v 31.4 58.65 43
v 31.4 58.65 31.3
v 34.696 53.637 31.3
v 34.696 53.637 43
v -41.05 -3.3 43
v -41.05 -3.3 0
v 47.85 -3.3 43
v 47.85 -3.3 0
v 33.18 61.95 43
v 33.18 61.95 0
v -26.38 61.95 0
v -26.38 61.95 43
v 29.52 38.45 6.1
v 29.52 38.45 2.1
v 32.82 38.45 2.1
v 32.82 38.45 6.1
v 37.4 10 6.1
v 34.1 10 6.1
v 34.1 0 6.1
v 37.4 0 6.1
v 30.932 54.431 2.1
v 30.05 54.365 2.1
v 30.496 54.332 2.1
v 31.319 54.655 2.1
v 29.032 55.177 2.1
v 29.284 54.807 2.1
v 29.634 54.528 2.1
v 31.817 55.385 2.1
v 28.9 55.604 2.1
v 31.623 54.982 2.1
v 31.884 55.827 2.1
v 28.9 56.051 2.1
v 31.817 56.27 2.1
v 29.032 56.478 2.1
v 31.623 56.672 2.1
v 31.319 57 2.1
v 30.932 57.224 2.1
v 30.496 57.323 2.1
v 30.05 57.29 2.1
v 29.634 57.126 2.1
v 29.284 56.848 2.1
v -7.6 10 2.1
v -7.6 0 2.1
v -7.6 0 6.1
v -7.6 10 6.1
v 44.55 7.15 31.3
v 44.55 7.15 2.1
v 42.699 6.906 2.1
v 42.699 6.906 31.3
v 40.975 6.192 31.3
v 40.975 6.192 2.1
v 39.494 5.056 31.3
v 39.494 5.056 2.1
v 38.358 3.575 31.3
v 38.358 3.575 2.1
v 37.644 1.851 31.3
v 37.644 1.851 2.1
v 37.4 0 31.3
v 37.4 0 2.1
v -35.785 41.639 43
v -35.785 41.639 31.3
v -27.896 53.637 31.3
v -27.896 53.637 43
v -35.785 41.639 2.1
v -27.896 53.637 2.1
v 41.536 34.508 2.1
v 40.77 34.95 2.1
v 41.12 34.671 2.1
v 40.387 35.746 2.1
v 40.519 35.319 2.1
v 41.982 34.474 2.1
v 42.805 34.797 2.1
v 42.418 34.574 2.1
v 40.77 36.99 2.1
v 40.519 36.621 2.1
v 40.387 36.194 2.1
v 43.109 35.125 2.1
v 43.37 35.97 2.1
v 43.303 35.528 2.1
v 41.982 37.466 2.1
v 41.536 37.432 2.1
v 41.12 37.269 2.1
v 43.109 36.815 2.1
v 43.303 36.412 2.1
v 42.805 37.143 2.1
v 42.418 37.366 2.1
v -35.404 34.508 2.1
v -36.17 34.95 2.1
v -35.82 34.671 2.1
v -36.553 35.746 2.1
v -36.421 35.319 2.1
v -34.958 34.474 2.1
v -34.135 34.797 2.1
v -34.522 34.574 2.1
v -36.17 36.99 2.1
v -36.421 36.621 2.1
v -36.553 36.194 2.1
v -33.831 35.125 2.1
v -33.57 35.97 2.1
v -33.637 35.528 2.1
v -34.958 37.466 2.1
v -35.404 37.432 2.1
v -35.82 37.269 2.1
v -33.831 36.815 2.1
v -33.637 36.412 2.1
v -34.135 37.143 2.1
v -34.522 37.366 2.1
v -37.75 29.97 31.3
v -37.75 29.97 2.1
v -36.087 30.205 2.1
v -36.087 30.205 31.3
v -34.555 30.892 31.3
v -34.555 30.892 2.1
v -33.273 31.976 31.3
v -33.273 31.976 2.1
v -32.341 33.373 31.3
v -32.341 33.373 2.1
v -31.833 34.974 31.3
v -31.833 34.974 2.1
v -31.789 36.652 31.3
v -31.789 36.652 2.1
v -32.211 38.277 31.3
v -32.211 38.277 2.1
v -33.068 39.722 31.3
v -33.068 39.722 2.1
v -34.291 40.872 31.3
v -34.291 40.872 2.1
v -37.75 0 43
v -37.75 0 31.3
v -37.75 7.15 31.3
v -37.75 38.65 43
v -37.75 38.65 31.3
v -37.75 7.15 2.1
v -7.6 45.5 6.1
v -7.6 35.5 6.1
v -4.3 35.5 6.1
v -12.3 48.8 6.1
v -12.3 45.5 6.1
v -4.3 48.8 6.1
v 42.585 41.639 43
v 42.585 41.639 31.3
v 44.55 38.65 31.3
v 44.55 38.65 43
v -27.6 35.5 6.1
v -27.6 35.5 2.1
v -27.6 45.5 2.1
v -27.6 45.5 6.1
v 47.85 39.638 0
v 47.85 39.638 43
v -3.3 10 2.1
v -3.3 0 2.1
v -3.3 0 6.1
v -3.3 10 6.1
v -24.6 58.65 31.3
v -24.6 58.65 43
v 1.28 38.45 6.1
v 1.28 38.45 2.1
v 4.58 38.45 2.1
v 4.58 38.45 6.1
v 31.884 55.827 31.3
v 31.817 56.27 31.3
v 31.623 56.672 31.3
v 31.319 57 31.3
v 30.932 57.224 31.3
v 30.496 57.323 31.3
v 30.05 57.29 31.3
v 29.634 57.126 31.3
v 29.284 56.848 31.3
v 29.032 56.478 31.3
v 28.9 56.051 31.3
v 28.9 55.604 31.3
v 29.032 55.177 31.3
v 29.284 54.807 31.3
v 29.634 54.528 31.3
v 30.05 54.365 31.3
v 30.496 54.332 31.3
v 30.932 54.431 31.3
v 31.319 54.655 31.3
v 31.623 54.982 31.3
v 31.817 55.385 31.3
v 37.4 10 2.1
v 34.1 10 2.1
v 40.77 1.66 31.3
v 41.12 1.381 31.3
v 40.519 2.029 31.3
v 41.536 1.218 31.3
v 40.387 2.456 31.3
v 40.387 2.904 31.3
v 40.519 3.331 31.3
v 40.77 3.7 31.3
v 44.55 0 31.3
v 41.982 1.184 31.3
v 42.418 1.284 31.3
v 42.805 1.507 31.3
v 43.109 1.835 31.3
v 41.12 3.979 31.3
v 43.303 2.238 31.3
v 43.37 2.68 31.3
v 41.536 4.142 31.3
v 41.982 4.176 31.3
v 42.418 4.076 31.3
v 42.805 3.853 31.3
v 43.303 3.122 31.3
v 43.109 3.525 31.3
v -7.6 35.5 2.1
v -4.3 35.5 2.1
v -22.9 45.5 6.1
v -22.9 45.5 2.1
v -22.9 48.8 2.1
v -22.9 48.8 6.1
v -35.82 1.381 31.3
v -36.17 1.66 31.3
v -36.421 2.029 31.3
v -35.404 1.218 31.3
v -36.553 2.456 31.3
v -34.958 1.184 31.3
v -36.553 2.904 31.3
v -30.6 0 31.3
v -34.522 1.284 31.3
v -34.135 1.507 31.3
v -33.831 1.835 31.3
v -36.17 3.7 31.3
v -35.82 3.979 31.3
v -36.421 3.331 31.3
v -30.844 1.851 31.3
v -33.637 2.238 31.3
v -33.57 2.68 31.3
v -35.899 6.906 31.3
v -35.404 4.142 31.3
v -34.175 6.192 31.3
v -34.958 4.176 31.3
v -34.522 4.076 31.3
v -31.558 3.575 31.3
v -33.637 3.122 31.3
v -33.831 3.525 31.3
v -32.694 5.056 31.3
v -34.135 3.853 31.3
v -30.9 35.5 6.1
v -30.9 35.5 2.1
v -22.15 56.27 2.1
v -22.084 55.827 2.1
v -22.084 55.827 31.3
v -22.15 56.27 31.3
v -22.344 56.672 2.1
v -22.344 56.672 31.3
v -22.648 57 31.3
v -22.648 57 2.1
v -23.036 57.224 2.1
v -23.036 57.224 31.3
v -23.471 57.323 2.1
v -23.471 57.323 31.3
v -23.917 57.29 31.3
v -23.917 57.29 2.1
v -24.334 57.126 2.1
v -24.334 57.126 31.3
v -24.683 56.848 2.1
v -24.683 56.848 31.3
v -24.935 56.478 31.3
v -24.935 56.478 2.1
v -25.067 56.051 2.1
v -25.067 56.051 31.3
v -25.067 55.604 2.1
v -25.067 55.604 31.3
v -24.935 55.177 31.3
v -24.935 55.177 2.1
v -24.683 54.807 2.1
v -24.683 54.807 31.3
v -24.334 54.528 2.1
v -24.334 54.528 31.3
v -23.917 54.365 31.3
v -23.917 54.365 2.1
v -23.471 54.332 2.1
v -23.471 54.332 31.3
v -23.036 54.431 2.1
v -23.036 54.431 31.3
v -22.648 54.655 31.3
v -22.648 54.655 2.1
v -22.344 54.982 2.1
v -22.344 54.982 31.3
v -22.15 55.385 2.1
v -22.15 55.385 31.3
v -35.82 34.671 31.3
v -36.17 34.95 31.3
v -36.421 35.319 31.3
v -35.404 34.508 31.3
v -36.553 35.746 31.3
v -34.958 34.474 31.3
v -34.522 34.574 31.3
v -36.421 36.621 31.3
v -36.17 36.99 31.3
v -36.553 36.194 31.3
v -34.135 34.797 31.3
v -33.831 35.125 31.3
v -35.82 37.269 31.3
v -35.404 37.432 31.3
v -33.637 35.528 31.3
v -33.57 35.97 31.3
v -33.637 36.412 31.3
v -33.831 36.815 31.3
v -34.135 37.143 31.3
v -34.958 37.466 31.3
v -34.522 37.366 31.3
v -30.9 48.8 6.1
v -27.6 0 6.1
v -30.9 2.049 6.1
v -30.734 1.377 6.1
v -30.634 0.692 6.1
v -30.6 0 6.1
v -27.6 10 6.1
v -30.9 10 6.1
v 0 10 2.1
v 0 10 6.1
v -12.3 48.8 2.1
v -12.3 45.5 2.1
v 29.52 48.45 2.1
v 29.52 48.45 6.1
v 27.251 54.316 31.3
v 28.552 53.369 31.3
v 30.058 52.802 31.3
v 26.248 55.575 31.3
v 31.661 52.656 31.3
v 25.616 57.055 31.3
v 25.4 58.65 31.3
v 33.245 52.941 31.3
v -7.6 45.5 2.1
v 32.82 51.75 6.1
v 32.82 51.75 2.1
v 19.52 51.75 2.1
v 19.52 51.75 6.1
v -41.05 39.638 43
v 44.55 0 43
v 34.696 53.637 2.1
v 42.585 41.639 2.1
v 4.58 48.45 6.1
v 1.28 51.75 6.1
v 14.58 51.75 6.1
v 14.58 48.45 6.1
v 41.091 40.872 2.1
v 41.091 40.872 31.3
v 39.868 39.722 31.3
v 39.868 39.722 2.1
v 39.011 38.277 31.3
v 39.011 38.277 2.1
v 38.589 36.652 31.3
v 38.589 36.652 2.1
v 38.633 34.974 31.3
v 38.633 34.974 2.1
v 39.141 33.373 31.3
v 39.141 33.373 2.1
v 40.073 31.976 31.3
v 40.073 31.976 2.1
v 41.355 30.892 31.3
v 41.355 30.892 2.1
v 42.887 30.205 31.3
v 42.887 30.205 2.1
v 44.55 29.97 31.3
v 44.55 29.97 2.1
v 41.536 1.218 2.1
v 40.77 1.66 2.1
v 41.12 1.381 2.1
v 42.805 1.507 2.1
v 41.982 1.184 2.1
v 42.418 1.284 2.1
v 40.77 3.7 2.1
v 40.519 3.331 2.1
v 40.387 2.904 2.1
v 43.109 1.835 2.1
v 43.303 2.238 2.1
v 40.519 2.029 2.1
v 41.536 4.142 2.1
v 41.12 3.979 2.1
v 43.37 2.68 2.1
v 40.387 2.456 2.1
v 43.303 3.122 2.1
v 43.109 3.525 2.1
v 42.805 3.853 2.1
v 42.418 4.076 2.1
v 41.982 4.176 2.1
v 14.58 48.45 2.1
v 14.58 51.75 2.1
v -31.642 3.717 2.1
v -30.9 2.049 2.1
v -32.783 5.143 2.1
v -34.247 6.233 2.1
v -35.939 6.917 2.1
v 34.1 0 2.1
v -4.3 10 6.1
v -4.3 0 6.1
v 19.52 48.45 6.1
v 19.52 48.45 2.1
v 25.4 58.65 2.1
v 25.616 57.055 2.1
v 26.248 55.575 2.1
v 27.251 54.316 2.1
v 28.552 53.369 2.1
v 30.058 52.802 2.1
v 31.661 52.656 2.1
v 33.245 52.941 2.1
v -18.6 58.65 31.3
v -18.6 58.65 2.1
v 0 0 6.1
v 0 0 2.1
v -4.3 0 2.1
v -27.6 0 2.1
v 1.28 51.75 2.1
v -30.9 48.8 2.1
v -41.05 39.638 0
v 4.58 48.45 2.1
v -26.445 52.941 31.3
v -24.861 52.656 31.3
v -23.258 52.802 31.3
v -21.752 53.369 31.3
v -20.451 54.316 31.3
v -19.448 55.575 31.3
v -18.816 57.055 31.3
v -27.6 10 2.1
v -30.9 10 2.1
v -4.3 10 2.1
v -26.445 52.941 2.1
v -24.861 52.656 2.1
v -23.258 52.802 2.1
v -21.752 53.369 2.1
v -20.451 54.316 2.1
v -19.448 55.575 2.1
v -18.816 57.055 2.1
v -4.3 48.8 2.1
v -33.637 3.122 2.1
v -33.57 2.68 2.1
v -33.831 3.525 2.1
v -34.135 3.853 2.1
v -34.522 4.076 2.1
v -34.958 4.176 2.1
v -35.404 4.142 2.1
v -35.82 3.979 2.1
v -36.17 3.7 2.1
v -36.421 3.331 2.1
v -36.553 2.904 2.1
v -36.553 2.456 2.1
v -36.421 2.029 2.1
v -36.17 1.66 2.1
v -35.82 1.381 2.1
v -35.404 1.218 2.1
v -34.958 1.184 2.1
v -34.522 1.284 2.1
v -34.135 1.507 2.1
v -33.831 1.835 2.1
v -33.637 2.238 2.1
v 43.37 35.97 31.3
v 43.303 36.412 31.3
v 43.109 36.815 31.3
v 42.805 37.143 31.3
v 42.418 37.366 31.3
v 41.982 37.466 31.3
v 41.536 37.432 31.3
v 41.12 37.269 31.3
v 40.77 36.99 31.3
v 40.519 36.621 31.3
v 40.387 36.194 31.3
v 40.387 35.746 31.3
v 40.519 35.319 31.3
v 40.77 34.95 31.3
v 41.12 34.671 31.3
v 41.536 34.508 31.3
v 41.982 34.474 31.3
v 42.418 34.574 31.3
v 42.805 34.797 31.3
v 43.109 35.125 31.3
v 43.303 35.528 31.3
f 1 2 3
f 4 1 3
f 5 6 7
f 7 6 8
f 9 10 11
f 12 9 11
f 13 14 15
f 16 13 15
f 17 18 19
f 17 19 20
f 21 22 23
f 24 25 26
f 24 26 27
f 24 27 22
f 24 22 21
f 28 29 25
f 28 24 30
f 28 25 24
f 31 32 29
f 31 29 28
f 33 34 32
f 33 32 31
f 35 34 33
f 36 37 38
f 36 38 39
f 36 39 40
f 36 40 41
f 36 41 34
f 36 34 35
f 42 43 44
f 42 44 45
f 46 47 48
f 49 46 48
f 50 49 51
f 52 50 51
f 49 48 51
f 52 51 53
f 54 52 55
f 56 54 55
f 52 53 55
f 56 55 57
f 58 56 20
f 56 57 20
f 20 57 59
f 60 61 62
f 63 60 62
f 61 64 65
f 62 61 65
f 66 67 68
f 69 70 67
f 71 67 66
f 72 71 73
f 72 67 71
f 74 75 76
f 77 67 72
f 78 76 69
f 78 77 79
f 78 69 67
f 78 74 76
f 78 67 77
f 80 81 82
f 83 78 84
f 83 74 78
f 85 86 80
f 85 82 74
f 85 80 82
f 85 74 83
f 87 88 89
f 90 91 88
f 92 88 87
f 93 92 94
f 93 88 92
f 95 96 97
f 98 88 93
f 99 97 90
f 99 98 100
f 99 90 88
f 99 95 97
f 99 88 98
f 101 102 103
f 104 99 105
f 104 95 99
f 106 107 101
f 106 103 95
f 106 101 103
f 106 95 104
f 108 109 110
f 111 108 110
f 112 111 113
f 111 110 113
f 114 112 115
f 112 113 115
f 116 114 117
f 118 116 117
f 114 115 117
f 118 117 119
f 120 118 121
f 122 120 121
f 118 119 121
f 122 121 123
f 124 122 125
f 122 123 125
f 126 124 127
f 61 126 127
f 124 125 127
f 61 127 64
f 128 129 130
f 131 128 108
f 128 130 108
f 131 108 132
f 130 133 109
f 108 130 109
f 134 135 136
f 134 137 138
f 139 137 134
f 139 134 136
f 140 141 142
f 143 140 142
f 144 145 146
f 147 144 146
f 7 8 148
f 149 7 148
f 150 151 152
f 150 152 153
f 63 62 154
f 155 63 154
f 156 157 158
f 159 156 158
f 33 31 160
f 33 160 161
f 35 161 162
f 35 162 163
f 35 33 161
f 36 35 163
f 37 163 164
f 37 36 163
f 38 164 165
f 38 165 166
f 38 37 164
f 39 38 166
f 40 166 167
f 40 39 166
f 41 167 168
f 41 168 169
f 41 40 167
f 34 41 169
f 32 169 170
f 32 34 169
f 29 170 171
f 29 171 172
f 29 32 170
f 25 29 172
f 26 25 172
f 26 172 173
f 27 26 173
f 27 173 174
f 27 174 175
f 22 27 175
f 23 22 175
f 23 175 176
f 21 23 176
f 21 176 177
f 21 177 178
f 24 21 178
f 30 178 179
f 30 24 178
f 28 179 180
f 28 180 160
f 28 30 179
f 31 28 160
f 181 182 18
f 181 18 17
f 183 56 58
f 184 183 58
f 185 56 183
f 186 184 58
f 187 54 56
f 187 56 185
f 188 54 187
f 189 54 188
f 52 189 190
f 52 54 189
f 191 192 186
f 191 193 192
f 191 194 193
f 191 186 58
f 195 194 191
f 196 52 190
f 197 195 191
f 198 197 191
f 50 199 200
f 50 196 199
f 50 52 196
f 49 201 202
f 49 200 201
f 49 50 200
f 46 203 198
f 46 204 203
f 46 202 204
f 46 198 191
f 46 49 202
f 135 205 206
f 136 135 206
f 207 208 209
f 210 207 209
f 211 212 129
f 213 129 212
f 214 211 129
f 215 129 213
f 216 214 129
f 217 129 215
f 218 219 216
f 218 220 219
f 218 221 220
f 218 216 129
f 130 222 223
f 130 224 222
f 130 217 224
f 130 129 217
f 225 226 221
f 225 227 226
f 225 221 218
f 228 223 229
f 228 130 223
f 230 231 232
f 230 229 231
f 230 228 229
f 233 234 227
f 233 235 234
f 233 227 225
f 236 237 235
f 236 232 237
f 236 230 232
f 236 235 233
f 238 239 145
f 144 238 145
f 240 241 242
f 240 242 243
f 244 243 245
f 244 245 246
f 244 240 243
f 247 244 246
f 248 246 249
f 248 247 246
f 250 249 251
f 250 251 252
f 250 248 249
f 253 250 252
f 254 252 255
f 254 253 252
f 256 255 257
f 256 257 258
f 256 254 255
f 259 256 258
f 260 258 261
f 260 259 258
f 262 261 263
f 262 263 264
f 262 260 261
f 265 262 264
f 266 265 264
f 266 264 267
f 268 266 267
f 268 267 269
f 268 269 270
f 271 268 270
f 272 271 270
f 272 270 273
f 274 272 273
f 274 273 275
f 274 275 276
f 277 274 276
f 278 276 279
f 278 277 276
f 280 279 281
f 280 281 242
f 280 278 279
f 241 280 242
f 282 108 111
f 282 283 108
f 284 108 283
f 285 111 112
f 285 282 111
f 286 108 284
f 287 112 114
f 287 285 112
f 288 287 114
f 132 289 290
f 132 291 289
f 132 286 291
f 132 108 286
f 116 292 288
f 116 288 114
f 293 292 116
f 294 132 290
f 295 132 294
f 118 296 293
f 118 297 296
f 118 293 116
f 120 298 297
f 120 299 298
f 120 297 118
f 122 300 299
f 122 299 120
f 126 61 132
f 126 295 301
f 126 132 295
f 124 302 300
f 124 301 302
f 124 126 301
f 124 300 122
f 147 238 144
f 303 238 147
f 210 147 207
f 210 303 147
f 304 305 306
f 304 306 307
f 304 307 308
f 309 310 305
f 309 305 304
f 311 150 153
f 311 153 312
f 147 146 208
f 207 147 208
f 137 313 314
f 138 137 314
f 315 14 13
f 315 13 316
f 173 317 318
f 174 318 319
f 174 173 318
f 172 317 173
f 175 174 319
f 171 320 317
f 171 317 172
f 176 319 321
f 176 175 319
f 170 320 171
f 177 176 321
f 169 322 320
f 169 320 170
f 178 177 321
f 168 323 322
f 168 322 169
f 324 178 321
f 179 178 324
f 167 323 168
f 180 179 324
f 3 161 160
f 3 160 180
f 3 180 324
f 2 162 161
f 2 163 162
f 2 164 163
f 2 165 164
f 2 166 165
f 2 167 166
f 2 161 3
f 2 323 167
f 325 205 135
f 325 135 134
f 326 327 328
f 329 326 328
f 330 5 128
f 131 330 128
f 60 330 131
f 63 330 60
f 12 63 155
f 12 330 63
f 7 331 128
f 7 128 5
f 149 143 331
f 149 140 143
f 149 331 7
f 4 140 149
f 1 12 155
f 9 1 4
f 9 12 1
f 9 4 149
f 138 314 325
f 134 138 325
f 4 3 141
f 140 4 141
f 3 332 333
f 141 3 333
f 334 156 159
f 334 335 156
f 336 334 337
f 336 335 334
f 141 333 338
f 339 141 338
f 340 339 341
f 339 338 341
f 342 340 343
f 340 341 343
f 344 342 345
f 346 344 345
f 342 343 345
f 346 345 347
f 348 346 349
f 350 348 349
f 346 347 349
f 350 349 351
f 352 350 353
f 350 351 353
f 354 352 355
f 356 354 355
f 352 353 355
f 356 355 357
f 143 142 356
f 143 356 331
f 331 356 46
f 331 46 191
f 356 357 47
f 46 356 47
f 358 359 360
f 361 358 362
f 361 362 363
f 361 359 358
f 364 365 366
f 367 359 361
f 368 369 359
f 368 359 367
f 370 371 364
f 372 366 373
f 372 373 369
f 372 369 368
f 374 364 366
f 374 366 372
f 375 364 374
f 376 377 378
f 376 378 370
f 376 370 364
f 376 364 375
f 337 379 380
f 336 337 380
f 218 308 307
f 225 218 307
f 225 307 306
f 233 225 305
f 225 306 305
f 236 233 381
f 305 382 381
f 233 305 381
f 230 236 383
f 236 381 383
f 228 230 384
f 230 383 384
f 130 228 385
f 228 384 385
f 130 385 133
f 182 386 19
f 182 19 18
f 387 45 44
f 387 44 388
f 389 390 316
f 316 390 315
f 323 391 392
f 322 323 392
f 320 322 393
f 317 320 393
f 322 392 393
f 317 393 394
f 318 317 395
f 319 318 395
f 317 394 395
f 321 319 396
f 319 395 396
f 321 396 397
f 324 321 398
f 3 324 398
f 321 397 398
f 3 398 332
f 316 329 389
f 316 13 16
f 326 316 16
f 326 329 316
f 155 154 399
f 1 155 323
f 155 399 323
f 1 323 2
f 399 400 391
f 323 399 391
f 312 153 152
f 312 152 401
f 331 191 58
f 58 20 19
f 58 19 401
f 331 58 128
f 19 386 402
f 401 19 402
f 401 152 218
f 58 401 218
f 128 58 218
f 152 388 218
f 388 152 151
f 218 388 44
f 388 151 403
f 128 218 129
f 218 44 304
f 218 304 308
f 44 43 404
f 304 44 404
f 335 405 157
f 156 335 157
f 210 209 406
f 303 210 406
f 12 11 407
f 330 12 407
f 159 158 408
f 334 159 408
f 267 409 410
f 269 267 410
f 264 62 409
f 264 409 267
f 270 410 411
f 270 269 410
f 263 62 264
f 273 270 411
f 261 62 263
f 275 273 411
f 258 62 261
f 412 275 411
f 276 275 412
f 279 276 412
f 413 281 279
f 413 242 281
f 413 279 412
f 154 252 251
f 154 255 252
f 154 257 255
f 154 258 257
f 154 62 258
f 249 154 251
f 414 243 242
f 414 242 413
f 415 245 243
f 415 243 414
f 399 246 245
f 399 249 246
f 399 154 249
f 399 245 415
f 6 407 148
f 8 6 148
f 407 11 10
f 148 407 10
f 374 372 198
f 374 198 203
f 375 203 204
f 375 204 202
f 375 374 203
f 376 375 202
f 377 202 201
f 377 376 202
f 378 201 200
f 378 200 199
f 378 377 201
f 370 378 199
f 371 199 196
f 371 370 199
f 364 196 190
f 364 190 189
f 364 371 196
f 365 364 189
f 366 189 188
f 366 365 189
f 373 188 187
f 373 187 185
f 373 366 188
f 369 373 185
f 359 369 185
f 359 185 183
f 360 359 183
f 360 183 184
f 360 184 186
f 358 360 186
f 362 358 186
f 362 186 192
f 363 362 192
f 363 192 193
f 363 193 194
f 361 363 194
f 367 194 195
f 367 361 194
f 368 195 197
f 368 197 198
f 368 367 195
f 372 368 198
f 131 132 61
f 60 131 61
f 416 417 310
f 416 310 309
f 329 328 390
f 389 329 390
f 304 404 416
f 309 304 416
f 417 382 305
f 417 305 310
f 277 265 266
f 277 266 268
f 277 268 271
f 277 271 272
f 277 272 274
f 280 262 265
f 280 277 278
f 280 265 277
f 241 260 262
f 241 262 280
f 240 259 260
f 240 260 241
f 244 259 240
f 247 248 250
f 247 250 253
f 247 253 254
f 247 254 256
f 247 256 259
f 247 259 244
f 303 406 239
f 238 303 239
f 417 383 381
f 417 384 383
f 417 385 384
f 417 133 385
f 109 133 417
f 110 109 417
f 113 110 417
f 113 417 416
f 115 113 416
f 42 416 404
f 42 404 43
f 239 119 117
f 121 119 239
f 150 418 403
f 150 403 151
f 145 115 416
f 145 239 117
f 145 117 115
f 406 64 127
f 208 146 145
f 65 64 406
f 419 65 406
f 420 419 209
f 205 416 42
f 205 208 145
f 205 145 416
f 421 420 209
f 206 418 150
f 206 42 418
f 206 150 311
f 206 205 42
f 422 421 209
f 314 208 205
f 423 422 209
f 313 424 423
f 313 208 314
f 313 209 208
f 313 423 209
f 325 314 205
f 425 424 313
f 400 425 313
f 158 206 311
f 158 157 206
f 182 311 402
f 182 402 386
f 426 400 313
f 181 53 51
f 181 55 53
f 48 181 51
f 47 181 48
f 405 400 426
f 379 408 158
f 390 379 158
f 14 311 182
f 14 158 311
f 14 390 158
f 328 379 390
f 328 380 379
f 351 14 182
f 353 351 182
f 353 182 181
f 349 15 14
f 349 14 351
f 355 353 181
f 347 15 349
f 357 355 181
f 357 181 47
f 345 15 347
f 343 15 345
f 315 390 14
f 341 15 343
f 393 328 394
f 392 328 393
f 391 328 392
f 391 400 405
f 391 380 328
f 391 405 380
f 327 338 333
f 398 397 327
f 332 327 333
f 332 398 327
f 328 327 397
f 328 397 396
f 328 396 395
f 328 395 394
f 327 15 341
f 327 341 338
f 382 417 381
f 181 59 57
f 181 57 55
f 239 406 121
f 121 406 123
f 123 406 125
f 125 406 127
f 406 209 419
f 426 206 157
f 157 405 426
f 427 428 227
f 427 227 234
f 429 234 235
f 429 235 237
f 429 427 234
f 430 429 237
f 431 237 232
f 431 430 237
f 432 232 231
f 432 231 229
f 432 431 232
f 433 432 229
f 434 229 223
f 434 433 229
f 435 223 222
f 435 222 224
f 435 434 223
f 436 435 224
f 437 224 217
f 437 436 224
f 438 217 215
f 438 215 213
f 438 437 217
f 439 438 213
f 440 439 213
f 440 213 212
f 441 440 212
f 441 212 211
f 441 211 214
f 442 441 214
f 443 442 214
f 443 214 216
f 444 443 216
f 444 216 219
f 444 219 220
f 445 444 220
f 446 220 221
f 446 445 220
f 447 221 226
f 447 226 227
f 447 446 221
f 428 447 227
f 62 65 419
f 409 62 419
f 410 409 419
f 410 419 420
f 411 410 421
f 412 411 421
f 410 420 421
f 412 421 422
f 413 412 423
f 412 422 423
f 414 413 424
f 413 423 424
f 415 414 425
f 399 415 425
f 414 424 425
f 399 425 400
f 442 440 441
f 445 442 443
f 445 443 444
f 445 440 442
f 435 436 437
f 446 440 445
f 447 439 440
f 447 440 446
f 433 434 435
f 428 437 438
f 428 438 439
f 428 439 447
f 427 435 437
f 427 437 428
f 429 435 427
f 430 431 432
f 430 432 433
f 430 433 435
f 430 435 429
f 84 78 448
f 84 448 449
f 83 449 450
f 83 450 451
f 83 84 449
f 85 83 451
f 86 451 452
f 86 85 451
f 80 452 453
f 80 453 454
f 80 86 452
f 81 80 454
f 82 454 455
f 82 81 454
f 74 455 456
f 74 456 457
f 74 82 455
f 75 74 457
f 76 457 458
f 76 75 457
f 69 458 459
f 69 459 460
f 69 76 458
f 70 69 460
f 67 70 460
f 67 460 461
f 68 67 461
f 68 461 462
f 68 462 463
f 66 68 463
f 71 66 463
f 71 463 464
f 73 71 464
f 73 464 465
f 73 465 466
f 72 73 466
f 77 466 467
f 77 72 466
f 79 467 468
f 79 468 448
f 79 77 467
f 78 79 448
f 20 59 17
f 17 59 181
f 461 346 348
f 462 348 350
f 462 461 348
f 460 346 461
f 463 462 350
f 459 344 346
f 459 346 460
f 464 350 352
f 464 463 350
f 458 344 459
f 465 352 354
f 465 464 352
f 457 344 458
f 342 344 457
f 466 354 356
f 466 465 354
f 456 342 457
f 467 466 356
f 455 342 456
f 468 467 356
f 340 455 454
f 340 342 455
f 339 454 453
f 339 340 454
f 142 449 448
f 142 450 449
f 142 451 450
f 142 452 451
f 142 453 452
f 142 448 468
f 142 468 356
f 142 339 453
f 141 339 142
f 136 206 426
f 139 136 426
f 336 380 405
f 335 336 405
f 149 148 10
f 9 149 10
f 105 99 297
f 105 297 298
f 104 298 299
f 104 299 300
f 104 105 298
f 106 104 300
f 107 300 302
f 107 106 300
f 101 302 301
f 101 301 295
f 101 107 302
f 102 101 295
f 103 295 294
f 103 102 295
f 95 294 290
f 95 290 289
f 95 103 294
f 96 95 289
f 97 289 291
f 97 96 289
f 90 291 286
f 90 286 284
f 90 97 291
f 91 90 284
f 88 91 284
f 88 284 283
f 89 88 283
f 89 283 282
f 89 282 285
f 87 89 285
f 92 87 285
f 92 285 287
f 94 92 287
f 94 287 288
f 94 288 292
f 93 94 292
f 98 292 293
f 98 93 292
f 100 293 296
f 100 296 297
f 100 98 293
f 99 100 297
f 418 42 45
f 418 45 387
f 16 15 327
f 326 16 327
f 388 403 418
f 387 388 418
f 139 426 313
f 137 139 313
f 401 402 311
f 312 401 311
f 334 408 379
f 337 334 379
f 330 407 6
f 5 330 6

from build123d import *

# Parameters (mm, degrees)
F6_R      = 1.5
F7_DEPTH  = 29.2
F4_R      = 1.5
F8_DEPTH  = 2.1
F1_W      = 3.3
F1_H      = 10
F0_W      = 3.3
F0_H      = 10
F9_DEPTH  = 6.1
F10_DEPTH = 40.9


with BuildPart() as f7:
    # F6 (on offset) → F7 (new body)
    with BuildSketch(Plane.XY.offset(2.1)):
        Polygon((33.1796569254, 61.95), (2.5, 61.95), (-26.3796569254, 61.95), (-41.05, 39.6376911413), (-41.05, -3.3), (47.85, -3.3), (47.85, 39.6376911413), align=None)
        Polygon((44.55, 29.97), (44.55, 7.15), (44.55, 0), (37.4, 0), (-30.6, 0), (-37.75, 0), (-37.75, 7.15), (-37.75, 29.97), (-37.75, 38.65), (-35.7847248185, 41.6390116829), (-27.896317712, 53.6365890312), (-24.6, 58.65), (-18.6, 58.65), (3.4, 58.65), (25.4, 58.65), (31.4, 58.65), (34.696317712, 53.6365890312), (42.5847248185, 41.6390116829), (44.55, 38.65), (44.55, 36.9490727423), align=None, mode=Mode.SUBTRACT)
        with BuildLine():
            ThreePointArc((42.5847248185, 41.6390116829), (38.6333256766, 34.9735237327), (44.55, 29.97))
            Line((44.55, 29.97), (44.55, 36.9490727423))
            Line((44.55, 36.9490727423), (44.55, 38.65))
            Line((44.55, 38.65), (42.5847248185, 41.6390116829))
        make_face()
        with Locations((41.87, 35.97)):
            Circle(F6_R, mode=Mode.SUBTRACT)
        with BuildLine():
            Line((-37.75, 38.65), (-37.75, 29.97))
            ThreePointArc((-37.75, 29.97), (-31.8333256766, 34.9735237327), (-35.7847248185, 41.6390116829))
            Line((-35.7847248185, 41.6390116829), (-37.75, 38.65))
        make_face()
        with Locations((-35.07, 35.97)):
            Circle(F6_R, mode=Mode.SUBTRACT)
        with BuildLine():
            Line((44.55, 0), (44.55, 7.15))
            ThreePointArc((44.55, 7.15), (39.4941865145, 5.0558134855), (37.4, 0))
            Line((37.4, 0), (44.55, 0))
        make_face()
        with Locations((41.87, 2.68)):
            Circle(F6_R, mode=Mode.SUBTRACT)
        with BuildLine():
            Line((-37.75, 0), (-30.6, 0))
            ThreePointArc((-30.6, 0), (-32.6941865145, 5.0558134855), (-37.75, 7.15))
            Line((-37.75, 7.15), (-37.75, 0))
        make_face()
        with Locations((-35.07, 2.68)):
            Circle(F6_R, mode=Mode.SUBTRACT)
        with BuildLine():
            ThreePointArc((25.4, 58.65), (28.5520100309, 53.3690007446), (34.696317712, 53.6365890312))
            Line((34.696317712, 53.6365890312), (31.4, 58.65))
            Line((31.4, 58.65), (25.4, 58.65))
        make_face()
        with Locations((30.3835309261, 55.8274496246)):
            Circle(F6_R, mode=Mode.SUBTRACT)
        with BuildLine():
            Line((-24.6, 58.65), (-27.896317712, 53.6365890312))
            ThreePointArc((-27.896317712, 53.6365890312), (-21.7520100309, 53.3690007446), (-18.6, 58.65))
            Line((-18.6, 58.65), (-24.6, 58.65))
        make_face()
        with Locations((-23.5835309261, 55.8274496246)):
            Circle(F6_R, mode=Mode.SUBTRACT)
    extrude(amount=F7_DEPTH)



with BuildPart() as f8:
    # F4 (on Top) → F8 (new body)
    with BuildSketch(Plane.XY):
        Polygon((33.1796569254, 61.95), (2.5, 61.95), (-26.3796569254, 61.95), (-41.05, 39.6376911413), (-41.05, -3.3), (47.85, -3.3), (47.85, 39.6376911413), align=None)
        with BuildLine():
            Line((44.55, 7.15), (44.55, 0))
            Line((44.55, 0), (37.4, 0))
            Line((37.4, 0), (-30.6, 0))
            Line((-30.6, 0), (-37.75, 0))
            Line((-37.75, 0), (-37.75, 7.15))
            Line((-37.75, 7.15), (-37.75, 29.97))
            Line((-37.75, 29.97), (-37.75, 38.65))
            Line((-37.75, 38.65), (-35.7847248185, 41.6390116829))
            Line((-35.7847248185, 41.6390116829), (-27.896317712, 53.6365890312))
            Line((-27.896317712, 53.6365890312), (-24.6, 58.65))
            Line((-24.6, 58.65), (-18.6, 58.65))
            Line((-18.6, 58.65), (3.4, 58.65))
            Line((3.4, 58.65), (25.4, 58.65))
            Line((25.4, 58.65), (31.4, 58.65))
            Line((31.4, 58.65), (34.696317712, 53.6365890312))
            Line((34.696317712, 53.6365890312), (42.5847248185, 41.6390116829))
            ThreePointArc((42.5847248185, 41.6390116829), (38.6333256766, 34.9735237327), (44.55, 29.97))
            Line((44.55, 29.97), (44.55, 7.15))
        make_face(mode=Mode.SUBTRACT)
        with BuildLine():
            Line((-30.6, 0), (37.4, 0))
            ThreePointArc((37.4, 0), (39.4941865145, 5.0558134855), (44.55, 7.15))
            Line((44.55, 7.15), (44.55, 29.97))
            ThreePointArc((44.55, 29.97), (38.6333256766, 34.9735237327), (42.5847248185, 41.6390116829))
            Line((42.5847248185, 41.6390116829), (34.696317712, 53.6365890312))
            ThreePointArc((34.696317712, 53.6365890312), (28.5520100309, 53.3690007446), (25.4, 58.65))
            Line((25.4, 58.65), (3.4, 58.65))
            Line((3.4, 58.65), (-18.6, 58.65))
            ThreePointArc((-18.6, 58.65), (-21.7520100309, 53.3690007446), (-27.896317712, 53.6365890312))
            Line((-27.896317712, 53.6365890312), (-35.7847248185, 41.6390116829))
            ThreePointArc((-35.7847248185, 41.6390116829), (-31.8333256766, 34.9735237327), (-37.75, 29.97))
            Line((-37.75, 29.97), (-37.75, 7.15))
            ThreePointArc((-37.75, 7.15), (-32.6941865145, 5.0558134855), (-30.6, 0))
        make_face()
        with BuildLine():
            Line((-37.75, 38.65), (-37.75, 29.97))
            ThreePointArc((-37.75, 29.97), (-31.8333256766, 34.9735237327), (-35.7847248185, 41.6390116829))
            Line((-35.7847248185, 41.6390116829), (-37.75, 38.65))
        make_face()
        with BuildLine():
            Line((-37.75, 0), (-30.6, 0))
            ThreePointArc((-30.6, 0), (-32.6941865145, 5.0558134855), (-37.75, 7.15))
            Line((-37.75, 7.15), (-37.75, 0))
        make_face()
        with BuildLine():
            Line((37.4, 0), (44.55, 0))
            Line((44.55, 0), (44.55, 7.15))
            ThreePointArc((44.55, 7.15), (39.4941865145, 5.0558134855), (37.4, 0))
        make_face()
        with BuildLine():
            ThreePointArc((25.4, 58.65), (28.5520100309, 53.3690007446), (34.696317712, 53.6365890312))
            Line((34.696317712, 53.6365890312), (31.4, 58.65))
            Line((31.4, 58.65), (25.4, 58.65))
        make_face()
        with Locations((30.3835309261, 55.8274496246)):
            Circle(F4_R, mode=Mode.SUBTRACT)
        with BuildLine():
            Line((-24.6, 58.65), (-27.896317712, 53.6365890312))
            ThreePointArc((-27.896317712, 53.6365890312), (-21.7520100309, 53.3690007446), (-18.6, 58.65))
            Line((-18.6, 58.65), (-24.6, 58.65))
        make_face()
        with Locations((-23.5835309261, 55.8274496246)):
            Circle(F4_R, mode=Mode.SUBTRACT)
        with Locations((30.3835309261, 55.8274496246)):
            Circle(F4_R)
        with Locations((-23.5835309261, 55.8274496246)):
            Circle(F4_R)
    extrude(amount=F8_DEPTH)


with BuildPart() as f7_1:
    add(f7.part)

    add(f8.part)  # F9 merges F8
    # F1 (on Top) + F0 (on Top) → F9 (join)
    with BuildSketch(Plane.XY):
        with Locations((-29.25, 40.5)):
            Rectangle(F1_W, F1_H)
        Polygon((-30.9, 45.5), (-27.6, 45.5), (-22.9, 45.5), (-22.9, 48.8), (-30.9, 48.8), align=None)
        with Locations((-29.25, 5)):
            Rectangle(F1_W, F1_H)
        with Locations((-5.95, 5)):
            Rectangle(F1_W, F1_H)
        with Locations((-5.95, 40.5)):
            Rectangle(F1_W, F1_H)
        Polygon((-12.3, 45.5), (-7.6, 45.5), (-4.3, 45.5), (-4.3, 48.8), (-12.3, 48.8), align=None)
    with BuildSketch(Plane.XY):
        with Locations((-1.65, 5)):
            Rectangle(F0_W, F0_H)
        with Locations((2.93, 43.45)):
            Rectangle(F0_W, F0_H)
        Polygon((1.28, 48.45), (4.58, 48.45), (14.58, 48.45), (14.58, 51.75), (1.28, 51.75), align=None)
        Polygon((19.52, 51.75), (19.52, 48.45), (29.52, 48.45), (32.82, 48.45), (32.82, 51.75), align=None)
        with Locations((31.17, 43.45)):
            Rectangle(F0_W, F0_H)
        with Locations((35.75, 5)):
            Rectangle(F0_W, F0_H)
    extrude(amount=F9_DEPTH)

    # F6 (on offset) → F10 (join)
    with BuildSketch(Plane.XY.offset(2.1)):
        Polygon((33.1796569254, 61.95), (2.5, 61.95), (-26.3796569254, 61.95), (-41.05, 39.6376911413), (-41.05, -3.3), (47.85, -3.3), (47.85, 39.6376911413), align=None)
        Polygon((44.55, 29.97), (44.55, 7.15), (44.55, 0), (37.4, 0), (-30.6, 0), (-37.75, 0), (-37.75, 7.15), (-37.75, 29.97), (-37.75, 38.65), (-35.7847248185, 41.6390116829), (-27.896317712, 53.6365890312), (-24.6, 58.65), (-18.6, 58.65), (3.4, 58.65), (25.4, 58.65), (31.4, 58.65), (34.696317712, 53.6365890312), (42.5847248185, 41.6390116829), (44.55, 38.65), (44.55, 36.9490727423), align=None, mode=Mode.SUBTRACT)
    extrude(amount=F10_DEPTH)


solid = f7_1.part
